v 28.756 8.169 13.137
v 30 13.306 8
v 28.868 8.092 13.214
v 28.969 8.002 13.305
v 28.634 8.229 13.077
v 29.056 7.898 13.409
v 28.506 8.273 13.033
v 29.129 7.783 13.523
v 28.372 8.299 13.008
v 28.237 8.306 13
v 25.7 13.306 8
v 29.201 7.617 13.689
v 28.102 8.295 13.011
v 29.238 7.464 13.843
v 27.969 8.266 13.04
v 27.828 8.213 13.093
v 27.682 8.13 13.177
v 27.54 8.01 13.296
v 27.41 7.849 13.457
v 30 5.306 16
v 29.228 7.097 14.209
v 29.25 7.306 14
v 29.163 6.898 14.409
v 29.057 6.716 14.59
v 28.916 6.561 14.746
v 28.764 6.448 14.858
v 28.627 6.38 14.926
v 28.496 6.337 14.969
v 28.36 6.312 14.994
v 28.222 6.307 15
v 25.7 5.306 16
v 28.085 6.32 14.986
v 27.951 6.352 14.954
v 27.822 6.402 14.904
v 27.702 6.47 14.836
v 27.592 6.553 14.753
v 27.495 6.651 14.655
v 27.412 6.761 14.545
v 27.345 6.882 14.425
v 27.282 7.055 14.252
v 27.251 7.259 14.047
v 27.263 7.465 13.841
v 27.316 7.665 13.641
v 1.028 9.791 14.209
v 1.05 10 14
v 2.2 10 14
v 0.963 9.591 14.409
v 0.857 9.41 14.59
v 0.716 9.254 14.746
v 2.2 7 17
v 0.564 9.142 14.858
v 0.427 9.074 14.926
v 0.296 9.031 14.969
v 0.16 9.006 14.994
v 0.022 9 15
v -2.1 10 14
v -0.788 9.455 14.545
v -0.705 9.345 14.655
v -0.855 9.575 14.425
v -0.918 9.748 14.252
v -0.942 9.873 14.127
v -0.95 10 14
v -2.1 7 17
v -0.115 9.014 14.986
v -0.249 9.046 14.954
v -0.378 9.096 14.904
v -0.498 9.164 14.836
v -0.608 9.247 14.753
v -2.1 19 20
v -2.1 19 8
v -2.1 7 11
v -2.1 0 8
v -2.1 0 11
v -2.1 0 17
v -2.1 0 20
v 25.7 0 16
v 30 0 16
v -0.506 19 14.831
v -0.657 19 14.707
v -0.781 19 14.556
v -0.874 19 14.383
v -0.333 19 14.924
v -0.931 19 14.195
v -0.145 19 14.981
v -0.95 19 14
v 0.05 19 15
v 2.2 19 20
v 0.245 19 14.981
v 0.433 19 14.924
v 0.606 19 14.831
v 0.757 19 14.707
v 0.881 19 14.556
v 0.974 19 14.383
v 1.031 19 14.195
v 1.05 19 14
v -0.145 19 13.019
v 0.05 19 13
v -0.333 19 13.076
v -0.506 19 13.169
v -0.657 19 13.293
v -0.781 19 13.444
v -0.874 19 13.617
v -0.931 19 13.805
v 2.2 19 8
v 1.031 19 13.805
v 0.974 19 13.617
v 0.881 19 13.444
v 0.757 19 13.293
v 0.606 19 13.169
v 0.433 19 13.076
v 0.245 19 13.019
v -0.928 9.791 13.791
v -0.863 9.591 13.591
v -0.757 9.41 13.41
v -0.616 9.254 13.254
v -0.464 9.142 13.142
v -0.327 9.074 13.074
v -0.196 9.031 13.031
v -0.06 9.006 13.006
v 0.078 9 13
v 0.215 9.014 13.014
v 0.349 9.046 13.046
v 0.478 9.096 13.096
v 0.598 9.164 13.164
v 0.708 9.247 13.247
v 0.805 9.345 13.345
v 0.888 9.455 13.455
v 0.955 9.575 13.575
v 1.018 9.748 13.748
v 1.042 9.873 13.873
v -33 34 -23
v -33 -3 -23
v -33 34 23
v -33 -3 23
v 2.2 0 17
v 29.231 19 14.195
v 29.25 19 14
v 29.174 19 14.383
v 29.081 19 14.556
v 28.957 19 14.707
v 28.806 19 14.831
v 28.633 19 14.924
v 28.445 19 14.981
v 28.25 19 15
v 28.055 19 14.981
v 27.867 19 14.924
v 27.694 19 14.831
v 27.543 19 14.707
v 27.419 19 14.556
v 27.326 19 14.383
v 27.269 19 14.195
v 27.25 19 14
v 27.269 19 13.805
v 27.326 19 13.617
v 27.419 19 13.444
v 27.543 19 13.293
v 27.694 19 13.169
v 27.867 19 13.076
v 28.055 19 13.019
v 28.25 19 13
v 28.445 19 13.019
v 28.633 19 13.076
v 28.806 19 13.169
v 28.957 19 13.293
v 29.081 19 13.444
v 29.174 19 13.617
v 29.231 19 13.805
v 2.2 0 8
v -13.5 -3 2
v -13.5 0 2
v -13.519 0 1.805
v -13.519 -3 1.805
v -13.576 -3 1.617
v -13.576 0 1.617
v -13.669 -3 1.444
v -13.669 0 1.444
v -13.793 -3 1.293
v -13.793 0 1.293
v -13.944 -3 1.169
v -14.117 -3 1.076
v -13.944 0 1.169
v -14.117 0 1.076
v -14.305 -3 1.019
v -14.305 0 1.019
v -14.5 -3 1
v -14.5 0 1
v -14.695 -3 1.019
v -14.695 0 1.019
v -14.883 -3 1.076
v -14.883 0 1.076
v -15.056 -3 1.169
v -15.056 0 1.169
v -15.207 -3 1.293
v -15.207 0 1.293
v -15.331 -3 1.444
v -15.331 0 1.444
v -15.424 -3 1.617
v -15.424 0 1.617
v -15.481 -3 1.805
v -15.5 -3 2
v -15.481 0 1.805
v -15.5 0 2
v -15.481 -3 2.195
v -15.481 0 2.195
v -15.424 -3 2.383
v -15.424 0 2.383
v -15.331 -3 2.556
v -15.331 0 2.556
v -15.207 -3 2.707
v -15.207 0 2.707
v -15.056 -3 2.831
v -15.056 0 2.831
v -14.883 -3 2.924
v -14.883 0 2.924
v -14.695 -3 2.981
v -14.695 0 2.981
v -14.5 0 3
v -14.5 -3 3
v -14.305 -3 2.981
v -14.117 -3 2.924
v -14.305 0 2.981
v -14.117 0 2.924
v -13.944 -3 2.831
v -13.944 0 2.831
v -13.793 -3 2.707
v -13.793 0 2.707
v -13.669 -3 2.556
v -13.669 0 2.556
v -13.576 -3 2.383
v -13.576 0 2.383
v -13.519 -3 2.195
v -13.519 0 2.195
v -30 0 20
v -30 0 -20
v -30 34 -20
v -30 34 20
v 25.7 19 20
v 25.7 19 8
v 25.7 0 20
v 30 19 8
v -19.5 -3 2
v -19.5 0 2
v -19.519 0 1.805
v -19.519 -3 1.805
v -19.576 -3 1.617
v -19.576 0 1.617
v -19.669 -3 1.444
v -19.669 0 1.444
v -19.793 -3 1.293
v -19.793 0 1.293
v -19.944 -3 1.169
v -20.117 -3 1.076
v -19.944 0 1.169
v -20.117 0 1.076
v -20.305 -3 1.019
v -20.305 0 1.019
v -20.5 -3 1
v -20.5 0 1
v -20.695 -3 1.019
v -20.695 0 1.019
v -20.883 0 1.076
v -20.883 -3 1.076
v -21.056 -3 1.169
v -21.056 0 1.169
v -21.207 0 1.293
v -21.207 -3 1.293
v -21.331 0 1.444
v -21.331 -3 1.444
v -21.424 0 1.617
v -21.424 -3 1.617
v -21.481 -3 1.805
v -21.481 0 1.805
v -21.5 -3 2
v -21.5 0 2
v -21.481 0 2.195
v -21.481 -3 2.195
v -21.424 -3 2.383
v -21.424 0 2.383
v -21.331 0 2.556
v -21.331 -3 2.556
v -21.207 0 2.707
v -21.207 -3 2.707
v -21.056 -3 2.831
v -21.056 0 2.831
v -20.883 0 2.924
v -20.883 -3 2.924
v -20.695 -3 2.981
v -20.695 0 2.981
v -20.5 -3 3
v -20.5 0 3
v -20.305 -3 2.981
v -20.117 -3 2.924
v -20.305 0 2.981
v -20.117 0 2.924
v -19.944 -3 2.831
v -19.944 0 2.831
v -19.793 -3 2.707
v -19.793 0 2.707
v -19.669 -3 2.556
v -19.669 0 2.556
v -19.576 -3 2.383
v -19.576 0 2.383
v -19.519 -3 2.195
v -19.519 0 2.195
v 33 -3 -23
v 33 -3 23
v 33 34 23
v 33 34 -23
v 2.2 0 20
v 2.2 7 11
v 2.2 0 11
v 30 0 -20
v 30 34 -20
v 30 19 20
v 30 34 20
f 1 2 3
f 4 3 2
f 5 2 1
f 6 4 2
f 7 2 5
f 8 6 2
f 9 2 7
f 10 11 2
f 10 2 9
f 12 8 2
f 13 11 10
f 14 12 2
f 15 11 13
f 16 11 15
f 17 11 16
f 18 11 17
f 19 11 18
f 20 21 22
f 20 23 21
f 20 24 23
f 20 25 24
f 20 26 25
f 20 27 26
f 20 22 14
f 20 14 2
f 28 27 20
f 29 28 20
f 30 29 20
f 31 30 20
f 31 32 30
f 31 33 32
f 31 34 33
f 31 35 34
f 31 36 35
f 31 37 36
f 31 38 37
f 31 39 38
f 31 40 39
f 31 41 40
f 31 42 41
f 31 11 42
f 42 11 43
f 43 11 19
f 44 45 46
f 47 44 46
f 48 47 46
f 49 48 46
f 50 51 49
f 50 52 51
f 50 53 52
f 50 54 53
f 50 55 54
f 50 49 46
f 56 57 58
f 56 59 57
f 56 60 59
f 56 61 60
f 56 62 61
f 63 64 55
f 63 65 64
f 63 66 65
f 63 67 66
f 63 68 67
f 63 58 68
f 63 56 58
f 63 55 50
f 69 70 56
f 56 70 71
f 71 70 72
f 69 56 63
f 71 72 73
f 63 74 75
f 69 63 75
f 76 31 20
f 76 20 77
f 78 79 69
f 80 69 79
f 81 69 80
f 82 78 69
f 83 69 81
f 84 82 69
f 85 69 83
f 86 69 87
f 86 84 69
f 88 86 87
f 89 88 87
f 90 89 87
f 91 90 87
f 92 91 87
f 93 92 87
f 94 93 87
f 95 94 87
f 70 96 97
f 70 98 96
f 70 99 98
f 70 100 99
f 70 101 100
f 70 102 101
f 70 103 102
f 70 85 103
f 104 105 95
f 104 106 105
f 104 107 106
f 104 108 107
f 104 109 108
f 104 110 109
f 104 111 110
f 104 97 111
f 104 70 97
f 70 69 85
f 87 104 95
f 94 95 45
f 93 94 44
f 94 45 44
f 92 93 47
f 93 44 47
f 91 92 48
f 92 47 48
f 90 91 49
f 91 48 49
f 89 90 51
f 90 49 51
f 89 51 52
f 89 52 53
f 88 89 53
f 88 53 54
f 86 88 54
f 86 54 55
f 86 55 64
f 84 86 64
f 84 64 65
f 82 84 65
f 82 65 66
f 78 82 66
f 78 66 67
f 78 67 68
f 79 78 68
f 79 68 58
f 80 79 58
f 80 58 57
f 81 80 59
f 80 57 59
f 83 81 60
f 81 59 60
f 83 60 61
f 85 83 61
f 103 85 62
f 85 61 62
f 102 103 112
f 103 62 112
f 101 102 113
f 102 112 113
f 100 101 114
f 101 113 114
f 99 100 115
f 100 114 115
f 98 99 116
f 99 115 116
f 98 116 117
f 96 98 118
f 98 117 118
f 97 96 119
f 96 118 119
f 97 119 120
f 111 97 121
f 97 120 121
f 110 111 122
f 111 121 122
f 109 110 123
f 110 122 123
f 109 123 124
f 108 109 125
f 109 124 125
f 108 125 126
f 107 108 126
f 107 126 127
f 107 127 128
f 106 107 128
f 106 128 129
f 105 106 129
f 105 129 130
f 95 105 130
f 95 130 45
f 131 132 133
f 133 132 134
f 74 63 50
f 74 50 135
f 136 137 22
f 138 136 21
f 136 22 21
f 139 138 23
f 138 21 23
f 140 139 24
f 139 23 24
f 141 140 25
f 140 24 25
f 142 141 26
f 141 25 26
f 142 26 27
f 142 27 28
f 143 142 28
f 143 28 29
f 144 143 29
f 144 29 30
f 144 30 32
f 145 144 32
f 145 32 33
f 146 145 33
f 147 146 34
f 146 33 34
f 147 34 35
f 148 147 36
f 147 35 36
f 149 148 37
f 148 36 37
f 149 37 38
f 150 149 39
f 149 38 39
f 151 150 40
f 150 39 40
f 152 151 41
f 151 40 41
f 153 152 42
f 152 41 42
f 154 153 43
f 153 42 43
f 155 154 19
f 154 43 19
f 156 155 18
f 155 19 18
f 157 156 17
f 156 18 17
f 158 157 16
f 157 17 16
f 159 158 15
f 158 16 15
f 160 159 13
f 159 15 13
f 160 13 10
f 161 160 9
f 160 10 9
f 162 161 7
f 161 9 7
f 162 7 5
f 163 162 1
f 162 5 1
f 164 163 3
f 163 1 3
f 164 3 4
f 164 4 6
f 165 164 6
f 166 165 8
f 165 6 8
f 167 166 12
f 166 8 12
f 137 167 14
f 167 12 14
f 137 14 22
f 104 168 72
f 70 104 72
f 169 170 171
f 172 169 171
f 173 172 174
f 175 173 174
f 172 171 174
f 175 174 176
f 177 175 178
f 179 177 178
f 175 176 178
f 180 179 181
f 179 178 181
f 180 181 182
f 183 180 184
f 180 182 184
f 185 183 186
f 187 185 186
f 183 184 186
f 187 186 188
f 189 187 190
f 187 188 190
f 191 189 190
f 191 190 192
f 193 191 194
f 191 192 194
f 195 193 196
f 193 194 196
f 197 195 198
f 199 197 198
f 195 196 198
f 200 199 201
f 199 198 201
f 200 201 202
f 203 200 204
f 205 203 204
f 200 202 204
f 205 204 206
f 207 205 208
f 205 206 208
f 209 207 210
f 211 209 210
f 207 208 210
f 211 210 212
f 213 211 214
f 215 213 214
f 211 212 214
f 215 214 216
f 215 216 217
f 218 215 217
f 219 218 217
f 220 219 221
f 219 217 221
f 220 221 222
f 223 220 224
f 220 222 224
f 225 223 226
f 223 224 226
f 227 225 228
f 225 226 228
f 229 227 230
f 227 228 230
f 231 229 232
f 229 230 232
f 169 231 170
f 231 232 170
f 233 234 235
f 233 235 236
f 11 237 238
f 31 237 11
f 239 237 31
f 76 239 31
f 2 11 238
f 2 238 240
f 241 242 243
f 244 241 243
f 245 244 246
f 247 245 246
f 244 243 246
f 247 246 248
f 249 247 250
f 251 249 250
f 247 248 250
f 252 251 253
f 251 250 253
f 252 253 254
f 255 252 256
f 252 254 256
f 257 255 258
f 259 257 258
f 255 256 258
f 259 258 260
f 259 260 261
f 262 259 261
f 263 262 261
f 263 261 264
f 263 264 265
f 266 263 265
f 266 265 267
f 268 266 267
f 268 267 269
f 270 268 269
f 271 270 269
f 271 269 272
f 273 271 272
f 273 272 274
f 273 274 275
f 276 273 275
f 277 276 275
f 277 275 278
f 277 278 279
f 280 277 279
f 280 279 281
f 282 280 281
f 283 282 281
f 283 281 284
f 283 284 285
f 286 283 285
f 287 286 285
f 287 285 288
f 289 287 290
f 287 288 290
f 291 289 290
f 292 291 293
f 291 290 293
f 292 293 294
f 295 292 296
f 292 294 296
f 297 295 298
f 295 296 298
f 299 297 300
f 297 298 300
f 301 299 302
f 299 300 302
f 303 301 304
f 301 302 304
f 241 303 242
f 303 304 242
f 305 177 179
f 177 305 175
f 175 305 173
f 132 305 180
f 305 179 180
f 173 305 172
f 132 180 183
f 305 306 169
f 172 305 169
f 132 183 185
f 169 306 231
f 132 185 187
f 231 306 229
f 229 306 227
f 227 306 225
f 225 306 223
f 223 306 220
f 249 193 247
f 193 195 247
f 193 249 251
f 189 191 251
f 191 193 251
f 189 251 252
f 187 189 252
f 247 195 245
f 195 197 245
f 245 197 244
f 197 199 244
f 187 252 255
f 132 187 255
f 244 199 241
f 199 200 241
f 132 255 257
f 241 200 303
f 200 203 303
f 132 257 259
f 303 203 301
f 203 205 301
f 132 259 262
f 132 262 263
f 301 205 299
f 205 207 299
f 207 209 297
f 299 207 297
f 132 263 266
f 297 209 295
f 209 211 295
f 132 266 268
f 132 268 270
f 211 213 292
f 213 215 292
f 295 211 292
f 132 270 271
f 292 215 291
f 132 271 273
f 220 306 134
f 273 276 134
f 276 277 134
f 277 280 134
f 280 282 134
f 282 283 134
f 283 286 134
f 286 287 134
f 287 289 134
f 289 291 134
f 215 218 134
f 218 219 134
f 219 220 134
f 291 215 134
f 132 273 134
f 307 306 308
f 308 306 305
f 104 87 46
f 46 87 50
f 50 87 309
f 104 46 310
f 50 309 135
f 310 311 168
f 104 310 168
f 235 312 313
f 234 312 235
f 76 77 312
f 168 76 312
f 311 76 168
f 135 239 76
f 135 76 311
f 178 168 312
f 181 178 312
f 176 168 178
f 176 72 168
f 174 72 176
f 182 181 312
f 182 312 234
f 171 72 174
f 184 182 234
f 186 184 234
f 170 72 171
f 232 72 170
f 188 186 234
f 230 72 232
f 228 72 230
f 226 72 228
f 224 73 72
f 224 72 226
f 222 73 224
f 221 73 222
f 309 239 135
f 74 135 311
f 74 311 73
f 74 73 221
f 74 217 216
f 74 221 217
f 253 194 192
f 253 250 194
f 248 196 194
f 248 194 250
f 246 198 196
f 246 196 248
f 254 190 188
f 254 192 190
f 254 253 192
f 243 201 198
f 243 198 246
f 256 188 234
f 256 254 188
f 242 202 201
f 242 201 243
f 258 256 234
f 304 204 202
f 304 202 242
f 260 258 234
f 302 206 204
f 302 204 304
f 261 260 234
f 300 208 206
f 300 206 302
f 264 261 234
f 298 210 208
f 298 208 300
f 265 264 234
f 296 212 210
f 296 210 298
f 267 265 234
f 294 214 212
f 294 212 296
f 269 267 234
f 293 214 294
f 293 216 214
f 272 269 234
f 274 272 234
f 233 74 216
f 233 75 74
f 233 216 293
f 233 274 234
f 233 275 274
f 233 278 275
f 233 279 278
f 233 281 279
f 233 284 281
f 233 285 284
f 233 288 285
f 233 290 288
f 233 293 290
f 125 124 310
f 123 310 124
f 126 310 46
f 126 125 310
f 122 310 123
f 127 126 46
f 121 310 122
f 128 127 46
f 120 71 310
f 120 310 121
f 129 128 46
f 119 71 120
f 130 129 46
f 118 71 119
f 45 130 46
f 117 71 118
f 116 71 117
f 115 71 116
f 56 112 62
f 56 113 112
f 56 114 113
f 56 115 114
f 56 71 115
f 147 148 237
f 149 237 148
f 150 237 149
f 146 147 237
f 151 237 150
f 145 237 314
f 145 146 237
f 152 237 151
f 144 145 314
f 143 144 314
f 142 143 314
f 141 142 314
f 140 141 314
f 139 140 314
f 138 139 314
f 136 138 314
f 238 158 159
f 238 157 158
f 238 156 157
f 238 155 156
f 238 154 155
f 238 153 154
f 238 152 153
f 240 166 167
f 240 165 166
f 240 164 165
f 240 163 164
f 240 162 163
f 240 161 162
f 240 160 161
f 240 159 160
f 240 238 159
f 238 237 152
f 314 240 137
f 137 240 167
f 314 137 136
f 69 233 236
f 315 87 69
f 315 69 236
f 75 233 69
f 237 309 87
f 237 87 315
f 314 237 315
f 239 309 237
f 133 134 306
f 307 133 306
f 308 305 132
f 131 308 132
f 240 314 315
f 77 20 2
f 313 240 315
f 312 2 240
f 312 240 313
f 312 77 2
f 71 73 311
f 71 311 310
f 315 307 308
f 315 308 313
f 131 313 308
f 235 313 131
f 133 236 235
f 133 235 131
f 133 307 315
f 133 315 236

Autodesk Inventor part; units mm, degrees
ref_plane "YZ Plane" through (0, 0, 0) normal (1, 0, 0) x (0, 1, 0)
ref_plane "XZ Plane" through (0, 0, 0) normal (0, 1, 0) x (-1, 0, 0)
ref_plane "XY Plane" through (0, 0, 0) normal (0, 0, 1) x (1, 0, 0)
sketch "스케치1" plane through (0, 0, 0) normal (0, 1, 0) x (-1, 0, 0)
  line L0 (30, 20) -> (-30, 20)
  line L1 (-30, 20) -> (-30, -20)
  line L2 (-30, -20) -> (30, -20)
  line L3 (30, 20) -> (-30, -20) construction
  line L4 (-30, 20) -> (30, -20) construction
  line L5 (30, -20) -> (30, 20)
  line L6 (33, 23) -> (-33, 23)
  line L7 (-33, 23) -> (-33, -23)
  line L8 (-33, -23) -> (33, -23)
  line L9 (33, -23) -> (33, 23)
  point P0 (0, 0)
  dimension "d0" = 60
  dimension "d1" = 40
  dimension "d6" = 3
extrude "돌출1" add sketch "스케치1" against normal blind 3 contours L5 L2 L1 L0 | L9 L8 L7 L6
extrude "돌출2" add sketch "스케치1" along normal blind 34
sketch "스케치2" plane through (0, 0, 0) normal (0, 1, 0) x (1, 0, 0)
  circle A0 centre (-20.5, -2) radius 1
  circle A1 centre (-14.5, -2) radius 1
  line L0 (-30, 20) -> (30, 20) projected
  line L1 (-30, -20) -> (-30, 20) projected
  point P0 (0, 0)
  dimension "d11" = 2
  dimension "d12" = 2
  dimension "d13" = 6
  dimension "d14" = 22
  dimension "d15" = 9.5
extrude "돌출3" cut sketch "스케치2" against normal blind 10
sketch "스케치3" plane through (0, 0, 0) normal (0, 1, 0) x (1, 0, 0)
  line L0 (30, -20) -> (-30, -20) projected
  line L1 (-2.1, -20) -> (2.2, -20)
  line L2 (2.2, -20) -> (2.2, -8)
  line L3 (2.2, -8) -> (-2.1, -8)
  line L4 (-2.1, -8) -> (-2.1, -20)
  line L5 (25.7, -8) -> (30, -8)
  line L6 (30, -8) -> (30, -20)
  line L7 (30, -20) -> (25.7, -20)
  line L8 (25.7, -20) -> (25.7, -8)
  circle A0 centre (0.05, -14) radius 1
  circle A1 centre (28.25, -14) radius 1
  point P0 (0, 0)
  point P1 (0.05, -8)
  point P2 (2.2, -14)
  point P3 (2.2, -20)
  dimension "d18" = 12
  dimension "d19" = 23.5
  dimension "d20" = 32.1
  dimension "d21" = 2
  dimension "d22" = 2
  dimension "d23" = 28.2
extrude "돌출4" add sketch "스케치3" along normal blind 19
sketch "스케치4" plane through (-2.1, 0, 8) normal (-1, 0, 0) x (0, 0, 1)
  line L0 (0, 0) -> (12, 0) projected
  line L1 (9, 0) -> (3, 0)
  line L2 (3, 0) -> (3, 7)
  line L3 (6, 10) -> (6, 10)
  line L4 (9, 7) -> (9, 0)
  line L5 (3, 7) -> (6, 10)
  line L6 (6, 10) -> (9, 7)
  point P0 (-8, 0)
  point P1 (3, 10)
  point P2 (9, 10)
  point P3 (6, 0)
  point P4 (6, 10)
  point P5 (3, 0)
  dimension "d26" = 6
  dimension "d27" = 10
  dimension "d28" = 3
  dimension "d29" = 3
  dimension "d30" = 3
  dimension "d31" = 3
extrude "돌출5" cut sketch "스케치4" against normal up to surface (4.3 mm away)
sketch "스케치5" plane through (25.7, 0, 8) normal (-1, 0, 0) x (0, 0, 1)
  line L0 (0, 13.3063) -> (8, 5.3063)
  line L1 (8, 5.3063) -> (8, 0)
  line L2 (7, 19) -> (7, 0) projected
  line L3 (0, 0) -> (-28, 0) projected
  line L4 (8, 0) -> (0, 0)
  line L5 (0, 0) -> (0, 13.3063)
  point P0 (-8, 0)
  dimension "d34" = 45
  dimension "d35" = 8
extrude "돌출6" cut sketch "스케치5" against normal up to surface (4.3 mm away)
equation "\"d29\" = d28"
equation "\"d30\" = d28"
equation "\"d31\" = d30"
properties part number "전체 하우징"
